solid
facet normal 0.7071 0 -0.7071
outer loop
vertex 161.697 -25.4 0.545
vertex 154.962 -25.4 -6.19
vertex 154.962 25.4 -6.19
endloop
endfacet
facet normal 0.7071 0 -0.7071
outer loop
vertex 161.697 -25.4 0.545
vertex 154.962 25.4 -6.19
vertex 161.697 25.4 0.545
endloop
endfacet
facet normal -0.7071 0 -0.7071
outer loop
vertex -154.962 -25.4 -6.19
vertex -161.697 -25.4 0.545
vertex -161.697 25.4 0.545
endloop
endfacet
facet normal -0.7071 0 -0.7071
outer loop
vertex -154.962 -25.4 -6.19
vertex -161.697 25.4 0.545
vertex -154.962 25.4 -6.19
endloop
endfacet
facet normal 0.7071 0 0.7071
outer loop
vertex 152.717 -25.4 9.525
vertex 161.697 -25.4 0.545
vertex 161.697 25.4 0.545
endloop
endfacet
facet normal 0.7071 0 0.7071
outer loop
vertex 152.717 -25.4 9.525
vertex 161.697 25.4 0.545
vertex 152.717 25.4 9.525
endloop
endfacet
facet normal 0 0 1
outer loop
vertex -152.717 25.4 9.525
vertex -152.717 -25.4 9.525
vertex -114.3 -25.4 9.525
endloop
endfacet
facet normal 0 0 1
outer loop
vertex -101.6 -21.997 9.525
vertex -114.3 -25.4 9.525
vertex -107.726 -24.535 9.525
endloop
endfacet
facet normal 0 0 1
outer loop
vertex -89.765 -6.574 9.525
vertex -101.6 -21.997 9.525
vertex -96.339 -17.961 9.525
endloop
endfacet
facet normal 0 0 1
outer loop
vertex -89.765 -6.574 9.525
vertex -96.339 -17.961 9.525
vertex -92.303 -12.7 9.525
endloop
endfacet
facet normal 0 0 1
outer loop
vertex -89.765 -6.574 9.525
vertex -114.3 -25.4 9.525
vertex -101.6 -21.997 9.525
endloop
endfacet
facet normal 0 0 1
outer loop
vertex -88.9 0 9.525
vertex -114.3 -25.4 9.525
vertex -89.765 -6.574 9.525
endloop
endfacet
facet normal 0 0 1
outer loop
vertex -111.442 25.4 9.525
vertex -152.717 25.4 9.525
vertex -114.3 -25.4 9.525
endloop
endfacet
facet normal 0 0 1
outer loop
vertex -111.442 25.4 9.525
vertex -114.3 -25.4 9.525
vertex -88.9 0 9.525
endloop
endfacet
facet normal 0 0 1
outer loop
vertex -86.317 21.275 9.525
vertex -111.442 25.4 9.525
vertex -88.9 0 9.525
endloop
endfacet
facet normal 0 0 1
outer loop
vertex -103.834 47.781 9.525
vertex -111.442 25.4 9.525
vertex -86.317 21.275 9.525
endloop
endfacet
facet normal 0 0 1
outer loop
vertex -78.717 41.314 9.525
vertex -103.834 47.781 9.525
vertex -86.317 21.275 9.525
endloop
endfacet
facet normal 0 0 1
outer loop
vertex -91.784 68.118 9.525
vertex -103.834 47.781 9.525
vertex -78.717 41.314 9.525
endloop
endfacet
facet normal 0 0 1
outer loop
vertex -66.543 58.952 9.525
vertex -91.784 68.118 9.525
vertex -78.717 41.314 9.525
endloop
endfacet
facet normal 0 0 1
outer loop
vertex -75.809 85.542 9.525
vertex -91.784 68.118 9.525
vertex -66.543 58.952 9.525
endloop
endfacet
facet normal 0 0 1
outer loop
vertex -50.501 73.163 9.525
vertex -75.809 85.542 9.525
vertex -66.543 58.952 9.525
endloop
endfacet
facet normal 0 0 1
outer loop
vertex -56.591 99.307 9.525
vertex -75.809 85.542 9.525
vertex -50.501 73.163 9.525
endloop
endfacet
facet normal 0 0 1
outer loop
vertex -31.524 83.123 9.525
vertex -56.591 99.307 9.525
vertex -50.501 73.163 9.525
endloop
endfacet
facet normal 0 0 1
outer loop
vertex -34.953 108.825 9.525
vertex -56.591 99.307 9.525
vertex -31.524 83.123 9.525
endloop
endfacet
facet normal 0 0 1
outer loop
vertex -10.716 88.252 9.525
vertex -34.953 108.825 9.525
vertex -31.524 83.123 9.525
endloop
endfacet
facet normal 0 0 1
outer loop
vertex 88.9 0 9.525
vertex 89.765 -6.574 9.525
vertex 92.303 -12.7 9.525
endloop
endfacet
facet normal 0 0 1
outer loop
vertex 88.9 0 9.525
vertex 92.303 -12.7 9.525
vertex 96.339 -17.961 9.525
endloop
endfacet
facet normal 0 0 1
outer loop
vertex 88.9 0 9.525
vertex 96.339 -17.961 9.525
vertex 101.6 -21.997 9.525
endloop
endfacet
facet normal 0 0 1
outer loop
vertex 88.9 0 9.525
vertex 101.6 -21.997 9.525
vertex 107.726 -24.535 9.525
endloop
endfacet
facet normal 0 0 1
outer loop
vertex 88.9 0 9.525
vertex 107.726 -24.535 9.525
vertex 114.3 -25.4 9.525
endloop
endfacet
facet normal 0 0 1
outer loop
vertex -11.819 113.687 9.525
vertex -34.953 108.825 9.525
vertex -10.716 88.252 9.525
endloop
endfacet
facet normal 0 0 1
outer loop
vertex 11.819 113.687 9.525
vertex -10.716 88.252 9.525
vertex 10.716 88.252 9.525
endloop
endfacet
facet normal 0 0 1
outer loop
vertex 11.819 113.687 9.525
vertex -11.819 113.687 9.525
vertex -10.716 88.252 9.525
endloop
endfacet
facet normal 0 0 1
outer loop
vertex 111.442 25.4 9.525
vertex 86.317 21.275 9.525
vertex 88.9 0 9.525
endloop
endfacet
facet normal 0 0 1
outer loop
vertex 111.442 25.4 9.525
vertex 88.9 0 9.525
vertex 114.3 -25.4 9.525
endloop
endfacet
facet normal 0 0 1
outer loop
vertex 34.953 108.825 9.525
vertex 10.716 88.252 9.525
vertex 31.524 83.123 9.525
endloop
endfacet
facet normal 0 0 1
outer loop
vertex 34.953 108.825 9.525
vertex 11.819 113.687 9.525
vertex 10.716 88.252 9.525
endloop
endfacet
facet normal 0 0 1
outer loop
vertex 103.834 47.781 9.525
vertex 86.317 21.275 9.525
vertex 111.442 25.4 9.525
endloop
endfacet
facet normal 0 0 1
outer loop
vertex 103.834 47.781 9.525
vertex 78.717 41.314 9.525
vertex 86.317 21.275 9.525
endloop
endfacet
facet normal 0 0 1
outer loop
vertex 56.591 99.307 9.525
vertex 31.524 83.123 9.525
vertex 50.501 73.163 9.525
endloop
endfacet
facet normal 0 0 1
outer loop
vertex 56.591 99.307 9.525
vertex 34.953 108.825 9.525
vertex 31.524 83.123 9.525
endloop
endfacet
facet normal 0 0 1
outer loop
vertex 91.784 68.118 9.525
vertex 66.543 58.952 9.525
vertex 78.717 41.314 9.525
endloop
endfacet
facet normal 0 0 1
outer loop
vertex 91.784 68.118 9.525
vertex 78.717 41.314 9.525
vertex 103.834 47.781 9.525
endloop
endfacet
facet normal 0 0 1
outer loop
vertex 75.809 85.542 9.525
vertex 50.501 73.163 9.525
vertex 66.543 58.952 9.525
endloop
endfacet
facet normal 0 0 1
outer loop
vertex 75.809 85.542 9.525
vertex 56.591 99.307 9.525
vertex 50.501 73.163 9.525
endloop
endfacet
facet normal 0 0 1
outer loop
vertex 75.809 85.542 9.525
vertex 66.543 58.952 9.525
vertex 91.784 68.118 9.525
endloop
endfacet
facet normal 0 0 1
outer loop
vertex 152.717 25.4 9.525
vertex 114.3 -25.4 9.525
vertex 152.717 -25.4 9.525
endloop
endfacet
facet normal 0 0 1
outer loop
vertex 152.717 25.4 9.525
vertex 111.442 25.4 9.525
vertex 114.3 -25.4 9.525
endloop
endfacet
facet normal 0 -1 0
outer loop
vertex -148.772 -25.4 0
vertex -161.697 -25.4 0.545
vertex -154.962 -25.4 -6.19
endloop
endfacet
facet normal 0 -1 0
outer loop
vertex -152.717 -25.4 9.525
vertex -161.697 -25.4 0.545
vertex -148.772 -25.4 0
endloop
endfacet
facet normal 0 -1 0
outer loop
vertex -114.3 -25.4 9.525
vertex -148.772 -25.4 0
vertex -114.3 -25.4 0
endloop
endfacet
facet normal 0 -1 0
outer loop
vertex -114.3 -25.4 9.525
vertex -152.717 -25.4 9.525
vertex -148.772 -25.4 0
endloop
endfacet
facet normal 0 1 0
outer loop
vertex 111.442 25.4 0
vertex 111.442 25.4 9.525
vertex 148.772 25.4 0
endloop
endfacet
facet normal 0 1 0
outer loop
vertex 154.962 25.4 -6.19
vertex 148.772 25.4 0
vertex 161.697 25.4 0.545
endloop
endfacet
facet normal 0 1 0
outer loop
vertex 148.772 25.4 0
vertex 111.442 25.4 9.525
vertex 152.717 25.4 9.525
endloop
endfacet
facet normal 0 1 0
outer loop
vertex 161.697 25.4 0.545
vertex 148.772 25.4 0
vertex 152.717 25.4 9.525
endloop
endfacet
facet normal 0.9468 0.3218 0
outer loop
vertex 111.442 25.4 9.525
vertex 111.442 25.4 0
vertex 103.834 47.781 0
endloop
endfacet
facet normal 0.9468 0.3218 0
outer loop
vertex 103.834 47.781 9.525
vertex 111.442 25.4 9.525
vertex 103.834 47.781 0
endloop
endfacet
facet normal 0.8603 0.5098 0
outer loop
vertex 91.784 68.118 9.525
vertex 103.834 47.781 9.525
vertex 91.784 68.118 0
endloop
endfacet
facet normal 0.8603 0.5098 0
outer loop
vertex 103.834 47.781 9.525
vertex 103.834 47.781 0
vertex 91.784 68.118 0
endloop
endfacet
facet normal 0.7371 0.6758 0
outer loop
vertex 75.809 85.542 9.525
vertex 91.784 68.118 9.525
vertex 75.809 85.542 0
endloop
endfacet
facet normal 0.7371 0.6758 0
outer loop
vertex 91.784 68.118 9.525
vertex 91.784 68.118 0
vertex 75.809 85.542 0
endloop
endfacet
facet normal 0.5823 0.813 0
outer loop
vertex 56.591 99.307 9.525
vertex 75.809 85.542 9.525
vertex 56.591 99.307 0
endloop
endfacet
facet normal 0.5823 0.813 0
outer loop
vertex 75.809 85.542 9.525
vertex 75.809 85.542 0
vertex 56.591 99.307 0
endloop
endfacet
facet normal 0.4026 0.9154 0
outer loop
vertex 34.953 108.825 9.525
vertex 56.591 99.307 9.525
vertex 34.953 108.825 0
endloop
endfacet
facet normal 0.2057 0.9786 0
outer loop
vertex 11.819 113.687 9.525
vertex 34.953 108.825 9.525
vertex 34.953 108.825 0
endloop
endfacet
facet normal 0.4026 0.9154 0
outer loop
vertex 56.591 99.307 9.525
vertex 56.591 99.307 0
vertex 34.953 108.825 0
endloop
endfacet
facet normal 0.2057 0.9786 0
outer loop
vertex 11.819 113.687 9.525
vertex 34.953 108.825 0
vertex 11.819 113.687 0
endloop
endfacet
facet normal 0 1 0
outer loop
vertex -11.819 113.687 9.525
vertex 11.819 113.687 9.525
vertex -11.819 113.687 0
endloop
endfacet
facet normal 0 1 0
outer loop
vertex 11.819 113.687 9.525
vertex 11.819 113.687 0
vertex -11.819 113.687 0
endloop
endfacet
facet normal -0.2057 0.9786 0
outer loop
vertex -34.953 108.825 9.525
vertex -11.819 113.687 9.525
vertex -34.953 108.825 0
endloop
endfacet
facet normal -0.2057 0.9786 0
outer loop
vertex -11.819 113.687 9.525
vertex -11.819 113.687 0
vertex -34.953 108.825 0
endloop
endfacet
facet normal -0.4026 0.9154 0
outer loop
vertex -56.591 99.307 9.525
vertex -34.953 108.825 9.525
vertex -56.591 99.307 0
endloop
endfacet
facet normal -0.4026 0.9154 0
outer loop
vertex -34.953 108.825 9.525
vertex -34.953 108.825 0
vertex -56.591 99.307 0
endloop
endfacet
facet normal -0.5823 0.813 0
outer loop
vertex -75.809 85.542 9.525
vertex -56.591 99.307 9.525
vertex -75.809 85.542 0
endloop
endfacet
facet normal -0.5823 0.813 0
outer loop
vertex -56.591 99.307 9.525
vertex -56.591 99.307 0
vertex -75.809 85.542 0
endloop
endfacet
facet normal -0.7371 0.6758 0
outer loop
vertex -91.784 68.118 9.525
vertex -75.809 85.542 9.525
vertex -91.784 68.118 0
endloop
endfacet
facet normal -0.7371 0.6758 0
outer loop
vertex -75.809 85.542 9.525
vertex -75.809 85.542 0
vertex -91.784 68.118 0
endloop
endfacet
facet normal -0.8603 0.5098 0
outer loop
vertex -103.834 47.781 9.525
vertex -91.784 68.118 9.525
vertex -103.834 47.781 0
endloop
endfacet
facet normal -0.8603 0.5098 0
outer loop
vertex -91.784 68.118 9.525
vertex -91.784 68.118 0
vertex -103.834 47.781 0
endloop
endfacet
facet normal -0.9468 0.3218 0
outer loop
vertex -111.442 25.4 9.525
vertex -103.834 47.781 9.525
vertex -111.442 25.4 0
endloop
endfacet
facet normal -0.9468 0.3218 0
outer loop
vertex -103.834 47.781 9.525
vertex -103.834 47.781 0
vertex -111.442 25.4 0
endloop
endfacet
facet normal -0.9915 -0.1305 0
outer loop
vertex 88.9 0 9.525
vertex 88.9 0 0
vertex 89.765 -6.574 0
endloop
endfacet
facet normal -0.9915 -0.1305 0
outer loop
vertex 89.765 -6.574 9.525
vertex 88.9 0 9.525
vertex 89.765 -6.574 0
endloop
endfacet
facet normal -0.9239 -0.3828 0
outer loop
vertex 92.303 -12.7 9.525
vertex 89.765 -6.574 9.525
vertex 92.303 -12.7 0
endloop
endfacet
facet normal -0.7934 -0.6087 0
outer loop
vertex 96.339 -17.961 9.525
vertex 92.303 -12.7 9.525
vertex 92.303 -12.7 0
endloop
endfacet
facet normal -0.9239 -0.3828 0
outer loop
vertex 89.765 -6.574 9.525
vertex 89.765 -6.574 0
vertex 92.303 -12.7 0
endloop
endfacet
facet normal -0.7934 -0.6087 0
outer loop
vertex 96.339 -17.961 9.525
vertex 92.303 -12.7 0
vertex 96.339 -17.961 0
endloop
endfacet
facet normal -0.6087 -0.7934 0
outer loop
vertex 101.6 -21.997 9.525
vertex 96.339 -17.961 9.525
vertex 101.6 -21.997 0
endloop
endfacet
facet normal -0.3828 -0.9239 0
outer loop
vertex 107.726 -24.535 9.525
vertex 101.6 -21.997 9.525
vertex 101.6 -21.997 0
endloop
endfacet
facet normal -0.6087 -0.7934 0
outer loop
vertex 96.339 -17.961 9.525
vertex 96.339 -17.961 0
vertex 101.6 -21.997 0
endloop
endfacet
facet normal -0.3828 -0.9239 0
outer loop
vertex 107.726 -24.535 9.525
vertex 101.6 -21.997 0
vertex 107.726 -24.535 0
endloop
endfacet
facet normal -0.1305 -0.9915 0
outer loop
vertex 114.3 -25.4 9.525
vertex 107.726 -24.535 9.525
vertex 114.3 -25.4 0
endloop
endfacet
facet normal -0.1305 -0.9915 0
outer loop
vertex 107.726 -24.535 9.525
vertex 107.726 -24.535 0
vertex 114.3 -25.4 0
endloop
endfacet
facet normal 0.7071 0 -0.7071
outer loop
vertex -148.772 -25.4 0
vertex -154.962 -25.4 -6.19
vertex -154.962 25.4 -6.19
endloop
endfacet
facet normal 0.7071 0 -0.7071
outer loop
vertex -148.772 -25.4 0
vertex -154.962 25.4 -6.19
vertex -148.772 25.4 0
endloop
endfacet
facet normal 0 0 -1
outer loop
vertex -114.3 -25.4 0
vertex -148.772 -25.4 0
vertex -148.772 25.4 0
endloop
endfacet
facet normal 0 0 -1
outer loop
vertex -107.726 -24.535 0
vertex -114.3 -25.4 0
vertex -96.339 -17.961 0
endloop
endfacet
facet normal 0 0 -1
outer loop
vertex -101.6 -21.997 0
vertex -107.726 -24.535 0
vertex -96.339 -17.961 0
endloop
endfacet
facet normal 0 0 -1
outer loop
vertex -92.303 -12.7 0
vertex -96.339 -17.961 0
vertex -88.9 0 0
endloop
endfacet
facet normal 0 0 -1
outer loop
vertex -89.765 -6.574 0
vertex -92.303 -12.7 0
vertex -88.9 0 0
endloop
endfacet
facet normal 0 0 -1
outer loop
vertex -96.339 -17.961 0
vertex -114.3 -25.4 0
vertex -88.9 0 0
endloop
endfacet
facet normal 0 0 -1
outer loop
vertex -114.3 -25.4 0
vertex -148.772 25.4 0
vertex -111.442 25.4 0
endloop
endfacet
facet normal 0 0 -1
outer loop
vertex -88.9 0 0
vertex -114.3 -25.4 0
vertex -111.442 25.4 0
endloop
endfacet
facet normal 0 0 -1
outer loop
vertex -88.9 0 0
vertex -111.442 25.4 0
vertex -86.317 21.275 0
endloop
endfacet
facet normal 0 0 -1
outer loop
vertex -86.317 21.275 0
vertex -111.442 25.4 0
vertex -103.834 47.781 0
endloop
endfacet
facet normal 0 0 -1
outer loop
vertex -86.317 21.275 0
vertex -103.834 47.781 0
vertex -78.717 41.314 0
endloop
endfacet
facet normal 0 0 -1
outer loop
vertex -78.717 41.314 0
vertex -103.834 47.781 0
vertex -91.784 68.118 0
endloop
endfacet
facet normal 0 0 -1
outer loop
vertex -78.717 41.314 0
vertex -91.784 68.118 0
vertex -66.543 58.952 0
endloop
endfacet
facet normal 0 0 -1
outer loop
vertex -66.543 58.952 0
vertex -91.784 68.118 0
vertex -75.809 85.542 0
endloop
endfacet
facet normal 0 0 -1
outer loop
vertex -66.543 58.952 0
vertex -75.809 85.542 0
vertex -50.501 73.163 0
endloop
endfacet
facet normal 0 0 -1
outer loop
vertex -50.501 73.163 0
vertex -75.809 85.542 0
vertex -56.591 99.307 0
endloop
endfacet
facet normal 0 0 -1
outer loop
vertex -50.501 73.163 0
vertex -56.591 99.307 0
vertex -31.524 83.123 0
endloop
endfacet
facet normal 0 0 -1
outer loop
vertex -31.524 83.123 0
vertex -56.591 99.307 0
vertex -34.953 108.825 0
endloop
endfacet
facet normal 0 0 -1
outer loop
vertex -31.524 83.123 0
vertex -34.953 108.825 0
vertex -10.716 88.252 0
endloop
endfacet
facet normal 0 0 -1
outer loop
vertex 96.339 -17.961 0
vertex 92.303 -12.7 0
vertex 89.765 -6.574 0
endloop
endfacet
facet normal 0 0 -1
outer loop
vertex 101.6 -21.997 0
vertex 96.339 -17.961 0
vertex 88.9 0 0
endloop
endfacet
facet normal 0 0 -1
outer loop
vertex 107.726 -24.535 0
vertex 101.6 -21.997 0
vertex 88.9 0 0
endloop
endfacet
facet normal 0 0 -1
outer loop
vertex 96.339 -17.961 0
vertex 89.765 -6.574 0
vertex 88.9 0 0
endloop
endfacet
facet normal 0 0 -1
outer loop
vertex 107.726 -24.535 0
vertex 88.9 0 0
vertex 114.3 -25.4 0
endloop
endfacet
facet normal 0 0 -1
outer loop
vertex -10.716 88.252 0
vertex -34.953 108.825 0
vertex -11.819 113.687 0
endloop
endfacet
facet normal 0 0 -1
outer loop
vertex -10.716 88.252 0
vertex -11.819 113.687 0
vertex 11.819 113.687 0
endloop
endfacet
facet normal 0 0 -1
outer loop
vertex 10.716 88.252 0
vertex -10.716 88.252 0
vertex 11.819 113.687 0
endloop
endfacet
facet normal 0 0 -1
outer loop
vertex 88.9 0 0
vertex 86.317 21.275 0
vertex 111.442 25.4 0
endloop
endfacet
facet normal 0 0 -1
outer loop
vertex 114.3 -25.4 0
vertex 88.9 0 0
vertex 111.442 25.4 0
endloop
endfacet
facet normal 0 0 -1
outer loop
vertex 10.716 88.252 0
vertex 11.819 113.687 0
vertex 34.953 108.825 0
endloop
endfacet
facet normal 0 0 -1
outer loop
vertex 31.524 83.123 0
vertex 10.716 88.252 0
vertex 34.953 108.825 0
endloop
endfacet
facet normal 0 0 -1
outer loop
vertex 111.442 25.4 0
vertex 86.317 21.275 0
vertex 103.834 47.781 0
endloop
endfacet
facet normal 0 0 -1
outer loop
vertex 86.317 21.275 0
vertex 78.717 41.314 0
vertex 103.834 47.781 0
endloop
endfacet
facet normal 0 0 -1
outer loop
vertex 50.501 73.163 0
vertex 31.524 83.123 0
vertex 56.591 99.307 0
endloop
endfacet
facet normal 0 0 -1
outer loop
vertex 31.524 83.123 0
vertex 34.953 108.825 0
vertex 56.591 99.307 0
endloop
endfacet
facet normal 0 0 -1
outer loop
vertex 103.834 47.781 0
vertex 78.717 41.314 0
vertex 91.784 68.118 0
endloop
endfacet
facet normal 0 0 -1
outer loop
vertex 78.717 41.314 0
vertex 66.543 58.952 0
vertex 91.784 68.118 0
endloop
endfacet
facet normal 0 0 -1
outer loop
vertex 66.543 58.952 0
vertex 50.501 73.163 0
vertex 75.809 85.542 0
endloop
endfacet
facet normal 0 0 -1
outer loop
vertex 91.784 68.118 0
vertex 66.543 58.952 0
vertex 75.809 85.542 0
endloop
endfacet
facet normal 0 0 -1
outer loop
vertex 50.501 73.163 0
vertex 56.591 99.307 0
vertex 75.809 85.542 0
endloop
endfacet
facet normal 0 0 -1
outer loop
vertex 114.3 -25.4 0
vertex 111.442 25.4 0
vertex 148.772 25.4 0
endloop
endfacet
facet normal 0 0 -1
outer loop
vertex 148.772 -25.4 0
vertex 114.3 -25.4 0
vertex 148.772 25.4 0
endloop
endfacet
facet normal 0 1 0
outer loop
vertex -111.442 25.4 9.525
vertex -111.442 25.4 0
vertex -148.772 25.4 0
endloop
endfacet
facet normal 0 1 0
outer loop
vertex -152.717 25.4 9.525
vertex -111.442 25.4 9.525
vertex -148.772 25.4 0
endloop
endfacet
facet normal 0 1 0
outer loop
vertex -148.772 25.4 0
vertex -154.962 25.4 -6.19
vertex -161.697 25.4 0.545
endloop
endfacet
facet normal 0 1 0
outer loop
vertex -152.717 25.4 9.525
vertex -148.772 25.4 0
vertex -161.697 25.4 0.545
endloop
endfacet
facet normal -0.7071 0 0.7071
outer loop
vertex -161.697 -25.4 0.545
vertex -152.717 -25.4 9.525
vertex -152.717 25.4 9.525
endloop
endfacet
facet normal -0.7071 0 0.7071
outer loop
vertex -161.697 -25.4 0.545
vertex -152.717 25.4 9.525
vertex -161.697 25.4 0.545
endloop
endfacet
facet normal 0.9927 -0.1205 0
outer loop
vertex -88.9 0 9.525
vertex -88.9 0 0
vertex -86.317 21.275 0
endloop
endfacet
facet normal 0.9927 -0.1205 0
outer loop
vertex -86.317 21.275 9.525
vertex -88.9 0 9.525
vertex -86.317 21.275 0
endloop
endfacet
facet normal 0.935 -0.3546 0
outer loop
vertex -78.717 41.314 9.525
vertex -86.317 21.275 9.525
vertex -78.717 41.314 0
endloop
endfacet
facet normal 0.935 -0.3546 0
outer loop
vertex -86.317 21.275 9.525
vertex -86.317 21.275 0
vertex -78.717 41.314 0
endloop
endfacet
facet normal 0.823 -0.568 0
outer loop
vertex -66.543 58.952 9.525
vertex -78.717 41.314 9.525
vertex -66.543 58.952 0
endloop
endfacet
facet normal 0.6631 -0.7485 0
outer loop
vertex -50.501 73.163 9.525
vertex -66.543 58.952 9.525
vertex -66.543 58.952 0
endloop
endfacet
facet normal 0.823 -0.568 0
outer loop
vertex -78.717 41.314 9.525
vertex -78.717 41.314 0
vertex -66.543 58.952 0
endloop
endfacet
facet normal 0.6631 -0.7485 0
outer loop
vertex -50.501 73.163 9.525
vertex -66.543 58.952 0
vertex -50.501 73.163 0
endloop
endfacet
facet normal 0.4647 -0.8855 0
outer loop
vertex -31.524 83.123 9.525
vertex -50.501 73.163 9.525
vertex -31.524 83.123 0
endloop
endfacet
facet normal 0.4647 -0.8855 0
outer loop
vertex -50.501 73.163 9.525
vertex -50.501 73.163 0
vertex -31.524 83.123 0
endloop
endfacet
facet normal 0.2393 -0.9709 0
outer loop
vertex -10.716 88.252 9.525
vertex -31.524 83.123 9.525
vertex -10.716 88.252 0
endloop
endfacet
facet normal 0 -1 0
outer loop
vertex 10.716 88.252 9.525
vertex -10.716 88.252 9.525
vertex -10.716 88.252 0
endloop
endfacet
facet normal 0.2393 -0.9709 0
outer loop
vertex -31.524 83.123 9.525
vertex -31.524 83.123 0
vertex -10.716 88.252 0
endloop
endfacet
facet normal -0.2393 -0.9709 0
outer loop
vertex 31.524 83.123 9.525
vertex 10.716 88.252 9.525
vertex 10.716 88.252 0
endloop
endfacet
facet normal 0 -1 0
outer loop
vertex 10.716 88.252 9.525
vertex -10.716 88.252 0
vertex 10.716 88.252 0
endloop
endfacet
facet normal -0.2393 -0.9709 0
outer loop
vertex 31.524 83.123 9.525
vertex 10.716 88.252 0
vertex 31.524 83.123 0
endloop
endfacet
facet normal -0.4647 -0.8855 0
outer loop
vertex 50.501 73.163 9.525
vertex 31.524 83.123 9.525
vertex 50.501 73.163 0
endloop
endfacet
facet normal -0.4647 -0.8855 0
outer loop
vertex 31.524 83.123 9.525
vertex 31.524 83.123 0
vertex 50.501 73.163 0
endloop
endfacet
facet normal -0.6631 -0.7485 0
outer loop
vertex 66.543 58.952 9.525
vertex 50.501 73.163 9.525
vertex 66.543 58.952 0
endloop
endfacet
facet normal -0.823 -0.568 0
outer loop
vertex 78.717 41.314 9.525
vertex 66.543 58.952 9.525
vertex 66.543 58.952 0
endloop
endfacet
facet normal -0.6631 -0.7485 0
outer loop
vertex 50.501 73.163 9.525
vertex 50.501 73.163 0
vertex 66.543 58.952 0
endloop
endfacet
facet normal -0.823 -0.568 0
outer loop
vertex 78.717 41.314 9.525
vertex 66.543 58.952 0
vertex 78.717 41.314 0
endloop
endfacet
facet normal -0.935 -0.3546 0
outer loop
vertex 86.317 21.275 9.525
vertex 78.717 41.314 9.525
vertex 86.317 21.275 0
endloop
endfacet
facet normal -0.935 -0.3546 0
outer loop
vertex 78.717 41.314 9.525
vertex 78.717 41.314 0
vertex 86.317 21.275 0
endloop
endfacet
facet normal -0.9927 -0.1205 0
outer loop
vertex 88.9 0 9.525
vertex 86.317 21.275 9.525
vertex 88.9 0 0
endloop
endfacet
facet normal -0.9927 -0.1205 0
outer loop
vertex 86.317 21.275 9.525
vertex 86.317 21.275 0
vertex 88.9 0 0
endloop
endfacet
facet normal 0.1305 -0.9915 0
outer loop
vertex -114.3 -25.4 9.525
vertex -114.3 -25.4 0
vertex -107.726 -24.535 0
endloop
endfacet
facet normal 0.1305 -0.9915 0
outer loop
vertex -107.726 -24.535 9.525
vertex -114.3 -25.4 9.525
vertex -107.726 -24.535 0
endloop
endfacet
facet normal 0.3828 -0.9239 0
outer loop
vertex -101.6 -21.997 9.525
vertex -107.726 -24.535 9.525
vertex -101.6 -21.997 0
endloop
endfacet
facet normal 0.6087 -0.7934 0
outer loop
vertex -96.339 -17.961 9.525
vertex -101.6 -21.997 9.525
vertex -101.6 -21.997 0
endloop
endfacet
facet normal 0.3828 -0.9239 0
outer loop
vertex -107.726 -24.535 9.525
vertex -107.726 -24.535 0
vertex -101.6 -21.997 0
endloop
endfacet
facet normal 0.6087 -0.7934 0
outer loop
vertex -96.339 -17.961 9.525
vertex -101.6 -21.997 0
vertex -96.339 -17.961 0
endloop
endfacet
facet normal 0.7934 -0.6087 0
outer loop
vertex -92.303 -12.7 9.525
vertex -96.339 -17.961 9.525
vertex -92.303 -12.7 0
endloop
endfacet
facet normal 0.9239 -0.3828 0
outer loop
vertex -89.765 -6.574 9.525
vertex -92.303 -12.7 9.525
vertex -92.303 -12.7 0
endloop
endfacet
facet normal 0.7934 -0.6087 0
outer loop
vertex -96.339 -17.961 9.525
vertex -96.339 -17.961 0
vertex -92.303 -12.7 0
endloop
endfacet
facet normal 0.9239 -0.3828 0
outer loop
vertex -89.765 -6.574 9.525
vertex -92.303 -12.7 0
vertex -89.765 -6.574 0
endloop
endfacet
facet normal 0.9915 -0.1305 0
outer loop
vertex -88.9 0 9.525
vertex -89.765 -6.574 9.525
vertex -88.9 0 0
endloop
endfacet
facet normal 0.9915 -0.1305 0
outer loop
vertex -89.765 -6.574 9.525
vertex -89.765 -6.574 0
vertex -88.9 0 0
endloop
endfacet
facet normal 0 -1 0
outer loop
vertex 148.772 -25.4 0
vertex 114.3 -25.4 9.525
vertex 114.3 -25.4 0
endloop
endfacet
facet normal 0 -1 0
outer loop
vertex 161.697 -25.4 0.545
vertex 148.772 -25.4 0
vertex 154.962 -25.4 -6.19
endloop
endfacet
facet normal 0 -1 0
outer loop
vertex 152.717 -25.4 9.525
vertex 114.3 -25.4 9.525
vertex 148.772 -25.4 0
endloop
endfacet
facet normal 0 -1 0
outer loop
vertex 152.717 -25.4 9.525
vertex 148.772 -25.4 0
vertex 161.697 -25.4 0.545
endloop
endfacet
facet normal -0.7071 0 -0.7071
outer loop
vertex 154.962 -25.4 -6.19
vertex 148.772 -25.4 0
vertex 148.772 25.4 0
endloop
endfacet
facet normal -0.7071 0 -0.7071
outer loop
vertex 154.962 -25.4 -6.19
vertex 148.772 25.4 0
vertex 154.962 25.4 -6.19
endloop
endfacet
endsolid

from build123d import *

# Parameters (mm, degrees)
F1_DEPTH = 9.525
F3_DEPTH = 50.8
F5_DEPTH = 50.8


with BuildPart() as f1:
    # F0 (on Top) → F1 (new body)
    with BuildSketch(Plane.XY):
        with BuildLine():
            ThreePointArc((-88.9, 0), (0, 88.9), (88.9, 0))
            ThreePointArc((88.9, 0), (96.339488, -17.960512), (114.3, -25.4))
            Line((114.3, -25.4), (152.717048, -25.4))
            Line((152.717048, -25.4), (152.717048, 25.4))
            Line((152.717048, 25.4), (111.442048, 25.4))
            ThreePointArc((111.442048, 25.4), (0, 114.3), (-111.442048, 25.4))
            Line((-111.442048, 25.4), (-152.717048, 25.4))
            Line((-152.717048, 25.4), (-152.717048, -25.4))
            Line((-152.717048, -25.4), (-114.3, -25.4))
            ThreePointArc((-114.3, -25.4), (-96.339488, -17.960512), (-88.9, 0))
        make_face()
    extrude(amount=F1_DEPTH)

    # F2 (on face) → F3 (join, through all)
    with BuildSketch(Plane.XZ.offset(25.4)):
        Polygon((161.697304, 0.544744), (152.717048, 9.525), (148.771664, 0), (154.962112, -6.190448), align=None)
    extrude(amount=-F3_DEPTH)

    # F4 (on face) → F5 (join, through all)
    with BuildSketch(Plane.XZ.offset(25.4)):
        Polygon((-148.771664, 0), (-152.717048, 9.525), (-161.697304, 0.544744), (-154.962112, -6.190448), align=None)
    extrude(amount=-F5_DEPTH)


solid = f1.part
